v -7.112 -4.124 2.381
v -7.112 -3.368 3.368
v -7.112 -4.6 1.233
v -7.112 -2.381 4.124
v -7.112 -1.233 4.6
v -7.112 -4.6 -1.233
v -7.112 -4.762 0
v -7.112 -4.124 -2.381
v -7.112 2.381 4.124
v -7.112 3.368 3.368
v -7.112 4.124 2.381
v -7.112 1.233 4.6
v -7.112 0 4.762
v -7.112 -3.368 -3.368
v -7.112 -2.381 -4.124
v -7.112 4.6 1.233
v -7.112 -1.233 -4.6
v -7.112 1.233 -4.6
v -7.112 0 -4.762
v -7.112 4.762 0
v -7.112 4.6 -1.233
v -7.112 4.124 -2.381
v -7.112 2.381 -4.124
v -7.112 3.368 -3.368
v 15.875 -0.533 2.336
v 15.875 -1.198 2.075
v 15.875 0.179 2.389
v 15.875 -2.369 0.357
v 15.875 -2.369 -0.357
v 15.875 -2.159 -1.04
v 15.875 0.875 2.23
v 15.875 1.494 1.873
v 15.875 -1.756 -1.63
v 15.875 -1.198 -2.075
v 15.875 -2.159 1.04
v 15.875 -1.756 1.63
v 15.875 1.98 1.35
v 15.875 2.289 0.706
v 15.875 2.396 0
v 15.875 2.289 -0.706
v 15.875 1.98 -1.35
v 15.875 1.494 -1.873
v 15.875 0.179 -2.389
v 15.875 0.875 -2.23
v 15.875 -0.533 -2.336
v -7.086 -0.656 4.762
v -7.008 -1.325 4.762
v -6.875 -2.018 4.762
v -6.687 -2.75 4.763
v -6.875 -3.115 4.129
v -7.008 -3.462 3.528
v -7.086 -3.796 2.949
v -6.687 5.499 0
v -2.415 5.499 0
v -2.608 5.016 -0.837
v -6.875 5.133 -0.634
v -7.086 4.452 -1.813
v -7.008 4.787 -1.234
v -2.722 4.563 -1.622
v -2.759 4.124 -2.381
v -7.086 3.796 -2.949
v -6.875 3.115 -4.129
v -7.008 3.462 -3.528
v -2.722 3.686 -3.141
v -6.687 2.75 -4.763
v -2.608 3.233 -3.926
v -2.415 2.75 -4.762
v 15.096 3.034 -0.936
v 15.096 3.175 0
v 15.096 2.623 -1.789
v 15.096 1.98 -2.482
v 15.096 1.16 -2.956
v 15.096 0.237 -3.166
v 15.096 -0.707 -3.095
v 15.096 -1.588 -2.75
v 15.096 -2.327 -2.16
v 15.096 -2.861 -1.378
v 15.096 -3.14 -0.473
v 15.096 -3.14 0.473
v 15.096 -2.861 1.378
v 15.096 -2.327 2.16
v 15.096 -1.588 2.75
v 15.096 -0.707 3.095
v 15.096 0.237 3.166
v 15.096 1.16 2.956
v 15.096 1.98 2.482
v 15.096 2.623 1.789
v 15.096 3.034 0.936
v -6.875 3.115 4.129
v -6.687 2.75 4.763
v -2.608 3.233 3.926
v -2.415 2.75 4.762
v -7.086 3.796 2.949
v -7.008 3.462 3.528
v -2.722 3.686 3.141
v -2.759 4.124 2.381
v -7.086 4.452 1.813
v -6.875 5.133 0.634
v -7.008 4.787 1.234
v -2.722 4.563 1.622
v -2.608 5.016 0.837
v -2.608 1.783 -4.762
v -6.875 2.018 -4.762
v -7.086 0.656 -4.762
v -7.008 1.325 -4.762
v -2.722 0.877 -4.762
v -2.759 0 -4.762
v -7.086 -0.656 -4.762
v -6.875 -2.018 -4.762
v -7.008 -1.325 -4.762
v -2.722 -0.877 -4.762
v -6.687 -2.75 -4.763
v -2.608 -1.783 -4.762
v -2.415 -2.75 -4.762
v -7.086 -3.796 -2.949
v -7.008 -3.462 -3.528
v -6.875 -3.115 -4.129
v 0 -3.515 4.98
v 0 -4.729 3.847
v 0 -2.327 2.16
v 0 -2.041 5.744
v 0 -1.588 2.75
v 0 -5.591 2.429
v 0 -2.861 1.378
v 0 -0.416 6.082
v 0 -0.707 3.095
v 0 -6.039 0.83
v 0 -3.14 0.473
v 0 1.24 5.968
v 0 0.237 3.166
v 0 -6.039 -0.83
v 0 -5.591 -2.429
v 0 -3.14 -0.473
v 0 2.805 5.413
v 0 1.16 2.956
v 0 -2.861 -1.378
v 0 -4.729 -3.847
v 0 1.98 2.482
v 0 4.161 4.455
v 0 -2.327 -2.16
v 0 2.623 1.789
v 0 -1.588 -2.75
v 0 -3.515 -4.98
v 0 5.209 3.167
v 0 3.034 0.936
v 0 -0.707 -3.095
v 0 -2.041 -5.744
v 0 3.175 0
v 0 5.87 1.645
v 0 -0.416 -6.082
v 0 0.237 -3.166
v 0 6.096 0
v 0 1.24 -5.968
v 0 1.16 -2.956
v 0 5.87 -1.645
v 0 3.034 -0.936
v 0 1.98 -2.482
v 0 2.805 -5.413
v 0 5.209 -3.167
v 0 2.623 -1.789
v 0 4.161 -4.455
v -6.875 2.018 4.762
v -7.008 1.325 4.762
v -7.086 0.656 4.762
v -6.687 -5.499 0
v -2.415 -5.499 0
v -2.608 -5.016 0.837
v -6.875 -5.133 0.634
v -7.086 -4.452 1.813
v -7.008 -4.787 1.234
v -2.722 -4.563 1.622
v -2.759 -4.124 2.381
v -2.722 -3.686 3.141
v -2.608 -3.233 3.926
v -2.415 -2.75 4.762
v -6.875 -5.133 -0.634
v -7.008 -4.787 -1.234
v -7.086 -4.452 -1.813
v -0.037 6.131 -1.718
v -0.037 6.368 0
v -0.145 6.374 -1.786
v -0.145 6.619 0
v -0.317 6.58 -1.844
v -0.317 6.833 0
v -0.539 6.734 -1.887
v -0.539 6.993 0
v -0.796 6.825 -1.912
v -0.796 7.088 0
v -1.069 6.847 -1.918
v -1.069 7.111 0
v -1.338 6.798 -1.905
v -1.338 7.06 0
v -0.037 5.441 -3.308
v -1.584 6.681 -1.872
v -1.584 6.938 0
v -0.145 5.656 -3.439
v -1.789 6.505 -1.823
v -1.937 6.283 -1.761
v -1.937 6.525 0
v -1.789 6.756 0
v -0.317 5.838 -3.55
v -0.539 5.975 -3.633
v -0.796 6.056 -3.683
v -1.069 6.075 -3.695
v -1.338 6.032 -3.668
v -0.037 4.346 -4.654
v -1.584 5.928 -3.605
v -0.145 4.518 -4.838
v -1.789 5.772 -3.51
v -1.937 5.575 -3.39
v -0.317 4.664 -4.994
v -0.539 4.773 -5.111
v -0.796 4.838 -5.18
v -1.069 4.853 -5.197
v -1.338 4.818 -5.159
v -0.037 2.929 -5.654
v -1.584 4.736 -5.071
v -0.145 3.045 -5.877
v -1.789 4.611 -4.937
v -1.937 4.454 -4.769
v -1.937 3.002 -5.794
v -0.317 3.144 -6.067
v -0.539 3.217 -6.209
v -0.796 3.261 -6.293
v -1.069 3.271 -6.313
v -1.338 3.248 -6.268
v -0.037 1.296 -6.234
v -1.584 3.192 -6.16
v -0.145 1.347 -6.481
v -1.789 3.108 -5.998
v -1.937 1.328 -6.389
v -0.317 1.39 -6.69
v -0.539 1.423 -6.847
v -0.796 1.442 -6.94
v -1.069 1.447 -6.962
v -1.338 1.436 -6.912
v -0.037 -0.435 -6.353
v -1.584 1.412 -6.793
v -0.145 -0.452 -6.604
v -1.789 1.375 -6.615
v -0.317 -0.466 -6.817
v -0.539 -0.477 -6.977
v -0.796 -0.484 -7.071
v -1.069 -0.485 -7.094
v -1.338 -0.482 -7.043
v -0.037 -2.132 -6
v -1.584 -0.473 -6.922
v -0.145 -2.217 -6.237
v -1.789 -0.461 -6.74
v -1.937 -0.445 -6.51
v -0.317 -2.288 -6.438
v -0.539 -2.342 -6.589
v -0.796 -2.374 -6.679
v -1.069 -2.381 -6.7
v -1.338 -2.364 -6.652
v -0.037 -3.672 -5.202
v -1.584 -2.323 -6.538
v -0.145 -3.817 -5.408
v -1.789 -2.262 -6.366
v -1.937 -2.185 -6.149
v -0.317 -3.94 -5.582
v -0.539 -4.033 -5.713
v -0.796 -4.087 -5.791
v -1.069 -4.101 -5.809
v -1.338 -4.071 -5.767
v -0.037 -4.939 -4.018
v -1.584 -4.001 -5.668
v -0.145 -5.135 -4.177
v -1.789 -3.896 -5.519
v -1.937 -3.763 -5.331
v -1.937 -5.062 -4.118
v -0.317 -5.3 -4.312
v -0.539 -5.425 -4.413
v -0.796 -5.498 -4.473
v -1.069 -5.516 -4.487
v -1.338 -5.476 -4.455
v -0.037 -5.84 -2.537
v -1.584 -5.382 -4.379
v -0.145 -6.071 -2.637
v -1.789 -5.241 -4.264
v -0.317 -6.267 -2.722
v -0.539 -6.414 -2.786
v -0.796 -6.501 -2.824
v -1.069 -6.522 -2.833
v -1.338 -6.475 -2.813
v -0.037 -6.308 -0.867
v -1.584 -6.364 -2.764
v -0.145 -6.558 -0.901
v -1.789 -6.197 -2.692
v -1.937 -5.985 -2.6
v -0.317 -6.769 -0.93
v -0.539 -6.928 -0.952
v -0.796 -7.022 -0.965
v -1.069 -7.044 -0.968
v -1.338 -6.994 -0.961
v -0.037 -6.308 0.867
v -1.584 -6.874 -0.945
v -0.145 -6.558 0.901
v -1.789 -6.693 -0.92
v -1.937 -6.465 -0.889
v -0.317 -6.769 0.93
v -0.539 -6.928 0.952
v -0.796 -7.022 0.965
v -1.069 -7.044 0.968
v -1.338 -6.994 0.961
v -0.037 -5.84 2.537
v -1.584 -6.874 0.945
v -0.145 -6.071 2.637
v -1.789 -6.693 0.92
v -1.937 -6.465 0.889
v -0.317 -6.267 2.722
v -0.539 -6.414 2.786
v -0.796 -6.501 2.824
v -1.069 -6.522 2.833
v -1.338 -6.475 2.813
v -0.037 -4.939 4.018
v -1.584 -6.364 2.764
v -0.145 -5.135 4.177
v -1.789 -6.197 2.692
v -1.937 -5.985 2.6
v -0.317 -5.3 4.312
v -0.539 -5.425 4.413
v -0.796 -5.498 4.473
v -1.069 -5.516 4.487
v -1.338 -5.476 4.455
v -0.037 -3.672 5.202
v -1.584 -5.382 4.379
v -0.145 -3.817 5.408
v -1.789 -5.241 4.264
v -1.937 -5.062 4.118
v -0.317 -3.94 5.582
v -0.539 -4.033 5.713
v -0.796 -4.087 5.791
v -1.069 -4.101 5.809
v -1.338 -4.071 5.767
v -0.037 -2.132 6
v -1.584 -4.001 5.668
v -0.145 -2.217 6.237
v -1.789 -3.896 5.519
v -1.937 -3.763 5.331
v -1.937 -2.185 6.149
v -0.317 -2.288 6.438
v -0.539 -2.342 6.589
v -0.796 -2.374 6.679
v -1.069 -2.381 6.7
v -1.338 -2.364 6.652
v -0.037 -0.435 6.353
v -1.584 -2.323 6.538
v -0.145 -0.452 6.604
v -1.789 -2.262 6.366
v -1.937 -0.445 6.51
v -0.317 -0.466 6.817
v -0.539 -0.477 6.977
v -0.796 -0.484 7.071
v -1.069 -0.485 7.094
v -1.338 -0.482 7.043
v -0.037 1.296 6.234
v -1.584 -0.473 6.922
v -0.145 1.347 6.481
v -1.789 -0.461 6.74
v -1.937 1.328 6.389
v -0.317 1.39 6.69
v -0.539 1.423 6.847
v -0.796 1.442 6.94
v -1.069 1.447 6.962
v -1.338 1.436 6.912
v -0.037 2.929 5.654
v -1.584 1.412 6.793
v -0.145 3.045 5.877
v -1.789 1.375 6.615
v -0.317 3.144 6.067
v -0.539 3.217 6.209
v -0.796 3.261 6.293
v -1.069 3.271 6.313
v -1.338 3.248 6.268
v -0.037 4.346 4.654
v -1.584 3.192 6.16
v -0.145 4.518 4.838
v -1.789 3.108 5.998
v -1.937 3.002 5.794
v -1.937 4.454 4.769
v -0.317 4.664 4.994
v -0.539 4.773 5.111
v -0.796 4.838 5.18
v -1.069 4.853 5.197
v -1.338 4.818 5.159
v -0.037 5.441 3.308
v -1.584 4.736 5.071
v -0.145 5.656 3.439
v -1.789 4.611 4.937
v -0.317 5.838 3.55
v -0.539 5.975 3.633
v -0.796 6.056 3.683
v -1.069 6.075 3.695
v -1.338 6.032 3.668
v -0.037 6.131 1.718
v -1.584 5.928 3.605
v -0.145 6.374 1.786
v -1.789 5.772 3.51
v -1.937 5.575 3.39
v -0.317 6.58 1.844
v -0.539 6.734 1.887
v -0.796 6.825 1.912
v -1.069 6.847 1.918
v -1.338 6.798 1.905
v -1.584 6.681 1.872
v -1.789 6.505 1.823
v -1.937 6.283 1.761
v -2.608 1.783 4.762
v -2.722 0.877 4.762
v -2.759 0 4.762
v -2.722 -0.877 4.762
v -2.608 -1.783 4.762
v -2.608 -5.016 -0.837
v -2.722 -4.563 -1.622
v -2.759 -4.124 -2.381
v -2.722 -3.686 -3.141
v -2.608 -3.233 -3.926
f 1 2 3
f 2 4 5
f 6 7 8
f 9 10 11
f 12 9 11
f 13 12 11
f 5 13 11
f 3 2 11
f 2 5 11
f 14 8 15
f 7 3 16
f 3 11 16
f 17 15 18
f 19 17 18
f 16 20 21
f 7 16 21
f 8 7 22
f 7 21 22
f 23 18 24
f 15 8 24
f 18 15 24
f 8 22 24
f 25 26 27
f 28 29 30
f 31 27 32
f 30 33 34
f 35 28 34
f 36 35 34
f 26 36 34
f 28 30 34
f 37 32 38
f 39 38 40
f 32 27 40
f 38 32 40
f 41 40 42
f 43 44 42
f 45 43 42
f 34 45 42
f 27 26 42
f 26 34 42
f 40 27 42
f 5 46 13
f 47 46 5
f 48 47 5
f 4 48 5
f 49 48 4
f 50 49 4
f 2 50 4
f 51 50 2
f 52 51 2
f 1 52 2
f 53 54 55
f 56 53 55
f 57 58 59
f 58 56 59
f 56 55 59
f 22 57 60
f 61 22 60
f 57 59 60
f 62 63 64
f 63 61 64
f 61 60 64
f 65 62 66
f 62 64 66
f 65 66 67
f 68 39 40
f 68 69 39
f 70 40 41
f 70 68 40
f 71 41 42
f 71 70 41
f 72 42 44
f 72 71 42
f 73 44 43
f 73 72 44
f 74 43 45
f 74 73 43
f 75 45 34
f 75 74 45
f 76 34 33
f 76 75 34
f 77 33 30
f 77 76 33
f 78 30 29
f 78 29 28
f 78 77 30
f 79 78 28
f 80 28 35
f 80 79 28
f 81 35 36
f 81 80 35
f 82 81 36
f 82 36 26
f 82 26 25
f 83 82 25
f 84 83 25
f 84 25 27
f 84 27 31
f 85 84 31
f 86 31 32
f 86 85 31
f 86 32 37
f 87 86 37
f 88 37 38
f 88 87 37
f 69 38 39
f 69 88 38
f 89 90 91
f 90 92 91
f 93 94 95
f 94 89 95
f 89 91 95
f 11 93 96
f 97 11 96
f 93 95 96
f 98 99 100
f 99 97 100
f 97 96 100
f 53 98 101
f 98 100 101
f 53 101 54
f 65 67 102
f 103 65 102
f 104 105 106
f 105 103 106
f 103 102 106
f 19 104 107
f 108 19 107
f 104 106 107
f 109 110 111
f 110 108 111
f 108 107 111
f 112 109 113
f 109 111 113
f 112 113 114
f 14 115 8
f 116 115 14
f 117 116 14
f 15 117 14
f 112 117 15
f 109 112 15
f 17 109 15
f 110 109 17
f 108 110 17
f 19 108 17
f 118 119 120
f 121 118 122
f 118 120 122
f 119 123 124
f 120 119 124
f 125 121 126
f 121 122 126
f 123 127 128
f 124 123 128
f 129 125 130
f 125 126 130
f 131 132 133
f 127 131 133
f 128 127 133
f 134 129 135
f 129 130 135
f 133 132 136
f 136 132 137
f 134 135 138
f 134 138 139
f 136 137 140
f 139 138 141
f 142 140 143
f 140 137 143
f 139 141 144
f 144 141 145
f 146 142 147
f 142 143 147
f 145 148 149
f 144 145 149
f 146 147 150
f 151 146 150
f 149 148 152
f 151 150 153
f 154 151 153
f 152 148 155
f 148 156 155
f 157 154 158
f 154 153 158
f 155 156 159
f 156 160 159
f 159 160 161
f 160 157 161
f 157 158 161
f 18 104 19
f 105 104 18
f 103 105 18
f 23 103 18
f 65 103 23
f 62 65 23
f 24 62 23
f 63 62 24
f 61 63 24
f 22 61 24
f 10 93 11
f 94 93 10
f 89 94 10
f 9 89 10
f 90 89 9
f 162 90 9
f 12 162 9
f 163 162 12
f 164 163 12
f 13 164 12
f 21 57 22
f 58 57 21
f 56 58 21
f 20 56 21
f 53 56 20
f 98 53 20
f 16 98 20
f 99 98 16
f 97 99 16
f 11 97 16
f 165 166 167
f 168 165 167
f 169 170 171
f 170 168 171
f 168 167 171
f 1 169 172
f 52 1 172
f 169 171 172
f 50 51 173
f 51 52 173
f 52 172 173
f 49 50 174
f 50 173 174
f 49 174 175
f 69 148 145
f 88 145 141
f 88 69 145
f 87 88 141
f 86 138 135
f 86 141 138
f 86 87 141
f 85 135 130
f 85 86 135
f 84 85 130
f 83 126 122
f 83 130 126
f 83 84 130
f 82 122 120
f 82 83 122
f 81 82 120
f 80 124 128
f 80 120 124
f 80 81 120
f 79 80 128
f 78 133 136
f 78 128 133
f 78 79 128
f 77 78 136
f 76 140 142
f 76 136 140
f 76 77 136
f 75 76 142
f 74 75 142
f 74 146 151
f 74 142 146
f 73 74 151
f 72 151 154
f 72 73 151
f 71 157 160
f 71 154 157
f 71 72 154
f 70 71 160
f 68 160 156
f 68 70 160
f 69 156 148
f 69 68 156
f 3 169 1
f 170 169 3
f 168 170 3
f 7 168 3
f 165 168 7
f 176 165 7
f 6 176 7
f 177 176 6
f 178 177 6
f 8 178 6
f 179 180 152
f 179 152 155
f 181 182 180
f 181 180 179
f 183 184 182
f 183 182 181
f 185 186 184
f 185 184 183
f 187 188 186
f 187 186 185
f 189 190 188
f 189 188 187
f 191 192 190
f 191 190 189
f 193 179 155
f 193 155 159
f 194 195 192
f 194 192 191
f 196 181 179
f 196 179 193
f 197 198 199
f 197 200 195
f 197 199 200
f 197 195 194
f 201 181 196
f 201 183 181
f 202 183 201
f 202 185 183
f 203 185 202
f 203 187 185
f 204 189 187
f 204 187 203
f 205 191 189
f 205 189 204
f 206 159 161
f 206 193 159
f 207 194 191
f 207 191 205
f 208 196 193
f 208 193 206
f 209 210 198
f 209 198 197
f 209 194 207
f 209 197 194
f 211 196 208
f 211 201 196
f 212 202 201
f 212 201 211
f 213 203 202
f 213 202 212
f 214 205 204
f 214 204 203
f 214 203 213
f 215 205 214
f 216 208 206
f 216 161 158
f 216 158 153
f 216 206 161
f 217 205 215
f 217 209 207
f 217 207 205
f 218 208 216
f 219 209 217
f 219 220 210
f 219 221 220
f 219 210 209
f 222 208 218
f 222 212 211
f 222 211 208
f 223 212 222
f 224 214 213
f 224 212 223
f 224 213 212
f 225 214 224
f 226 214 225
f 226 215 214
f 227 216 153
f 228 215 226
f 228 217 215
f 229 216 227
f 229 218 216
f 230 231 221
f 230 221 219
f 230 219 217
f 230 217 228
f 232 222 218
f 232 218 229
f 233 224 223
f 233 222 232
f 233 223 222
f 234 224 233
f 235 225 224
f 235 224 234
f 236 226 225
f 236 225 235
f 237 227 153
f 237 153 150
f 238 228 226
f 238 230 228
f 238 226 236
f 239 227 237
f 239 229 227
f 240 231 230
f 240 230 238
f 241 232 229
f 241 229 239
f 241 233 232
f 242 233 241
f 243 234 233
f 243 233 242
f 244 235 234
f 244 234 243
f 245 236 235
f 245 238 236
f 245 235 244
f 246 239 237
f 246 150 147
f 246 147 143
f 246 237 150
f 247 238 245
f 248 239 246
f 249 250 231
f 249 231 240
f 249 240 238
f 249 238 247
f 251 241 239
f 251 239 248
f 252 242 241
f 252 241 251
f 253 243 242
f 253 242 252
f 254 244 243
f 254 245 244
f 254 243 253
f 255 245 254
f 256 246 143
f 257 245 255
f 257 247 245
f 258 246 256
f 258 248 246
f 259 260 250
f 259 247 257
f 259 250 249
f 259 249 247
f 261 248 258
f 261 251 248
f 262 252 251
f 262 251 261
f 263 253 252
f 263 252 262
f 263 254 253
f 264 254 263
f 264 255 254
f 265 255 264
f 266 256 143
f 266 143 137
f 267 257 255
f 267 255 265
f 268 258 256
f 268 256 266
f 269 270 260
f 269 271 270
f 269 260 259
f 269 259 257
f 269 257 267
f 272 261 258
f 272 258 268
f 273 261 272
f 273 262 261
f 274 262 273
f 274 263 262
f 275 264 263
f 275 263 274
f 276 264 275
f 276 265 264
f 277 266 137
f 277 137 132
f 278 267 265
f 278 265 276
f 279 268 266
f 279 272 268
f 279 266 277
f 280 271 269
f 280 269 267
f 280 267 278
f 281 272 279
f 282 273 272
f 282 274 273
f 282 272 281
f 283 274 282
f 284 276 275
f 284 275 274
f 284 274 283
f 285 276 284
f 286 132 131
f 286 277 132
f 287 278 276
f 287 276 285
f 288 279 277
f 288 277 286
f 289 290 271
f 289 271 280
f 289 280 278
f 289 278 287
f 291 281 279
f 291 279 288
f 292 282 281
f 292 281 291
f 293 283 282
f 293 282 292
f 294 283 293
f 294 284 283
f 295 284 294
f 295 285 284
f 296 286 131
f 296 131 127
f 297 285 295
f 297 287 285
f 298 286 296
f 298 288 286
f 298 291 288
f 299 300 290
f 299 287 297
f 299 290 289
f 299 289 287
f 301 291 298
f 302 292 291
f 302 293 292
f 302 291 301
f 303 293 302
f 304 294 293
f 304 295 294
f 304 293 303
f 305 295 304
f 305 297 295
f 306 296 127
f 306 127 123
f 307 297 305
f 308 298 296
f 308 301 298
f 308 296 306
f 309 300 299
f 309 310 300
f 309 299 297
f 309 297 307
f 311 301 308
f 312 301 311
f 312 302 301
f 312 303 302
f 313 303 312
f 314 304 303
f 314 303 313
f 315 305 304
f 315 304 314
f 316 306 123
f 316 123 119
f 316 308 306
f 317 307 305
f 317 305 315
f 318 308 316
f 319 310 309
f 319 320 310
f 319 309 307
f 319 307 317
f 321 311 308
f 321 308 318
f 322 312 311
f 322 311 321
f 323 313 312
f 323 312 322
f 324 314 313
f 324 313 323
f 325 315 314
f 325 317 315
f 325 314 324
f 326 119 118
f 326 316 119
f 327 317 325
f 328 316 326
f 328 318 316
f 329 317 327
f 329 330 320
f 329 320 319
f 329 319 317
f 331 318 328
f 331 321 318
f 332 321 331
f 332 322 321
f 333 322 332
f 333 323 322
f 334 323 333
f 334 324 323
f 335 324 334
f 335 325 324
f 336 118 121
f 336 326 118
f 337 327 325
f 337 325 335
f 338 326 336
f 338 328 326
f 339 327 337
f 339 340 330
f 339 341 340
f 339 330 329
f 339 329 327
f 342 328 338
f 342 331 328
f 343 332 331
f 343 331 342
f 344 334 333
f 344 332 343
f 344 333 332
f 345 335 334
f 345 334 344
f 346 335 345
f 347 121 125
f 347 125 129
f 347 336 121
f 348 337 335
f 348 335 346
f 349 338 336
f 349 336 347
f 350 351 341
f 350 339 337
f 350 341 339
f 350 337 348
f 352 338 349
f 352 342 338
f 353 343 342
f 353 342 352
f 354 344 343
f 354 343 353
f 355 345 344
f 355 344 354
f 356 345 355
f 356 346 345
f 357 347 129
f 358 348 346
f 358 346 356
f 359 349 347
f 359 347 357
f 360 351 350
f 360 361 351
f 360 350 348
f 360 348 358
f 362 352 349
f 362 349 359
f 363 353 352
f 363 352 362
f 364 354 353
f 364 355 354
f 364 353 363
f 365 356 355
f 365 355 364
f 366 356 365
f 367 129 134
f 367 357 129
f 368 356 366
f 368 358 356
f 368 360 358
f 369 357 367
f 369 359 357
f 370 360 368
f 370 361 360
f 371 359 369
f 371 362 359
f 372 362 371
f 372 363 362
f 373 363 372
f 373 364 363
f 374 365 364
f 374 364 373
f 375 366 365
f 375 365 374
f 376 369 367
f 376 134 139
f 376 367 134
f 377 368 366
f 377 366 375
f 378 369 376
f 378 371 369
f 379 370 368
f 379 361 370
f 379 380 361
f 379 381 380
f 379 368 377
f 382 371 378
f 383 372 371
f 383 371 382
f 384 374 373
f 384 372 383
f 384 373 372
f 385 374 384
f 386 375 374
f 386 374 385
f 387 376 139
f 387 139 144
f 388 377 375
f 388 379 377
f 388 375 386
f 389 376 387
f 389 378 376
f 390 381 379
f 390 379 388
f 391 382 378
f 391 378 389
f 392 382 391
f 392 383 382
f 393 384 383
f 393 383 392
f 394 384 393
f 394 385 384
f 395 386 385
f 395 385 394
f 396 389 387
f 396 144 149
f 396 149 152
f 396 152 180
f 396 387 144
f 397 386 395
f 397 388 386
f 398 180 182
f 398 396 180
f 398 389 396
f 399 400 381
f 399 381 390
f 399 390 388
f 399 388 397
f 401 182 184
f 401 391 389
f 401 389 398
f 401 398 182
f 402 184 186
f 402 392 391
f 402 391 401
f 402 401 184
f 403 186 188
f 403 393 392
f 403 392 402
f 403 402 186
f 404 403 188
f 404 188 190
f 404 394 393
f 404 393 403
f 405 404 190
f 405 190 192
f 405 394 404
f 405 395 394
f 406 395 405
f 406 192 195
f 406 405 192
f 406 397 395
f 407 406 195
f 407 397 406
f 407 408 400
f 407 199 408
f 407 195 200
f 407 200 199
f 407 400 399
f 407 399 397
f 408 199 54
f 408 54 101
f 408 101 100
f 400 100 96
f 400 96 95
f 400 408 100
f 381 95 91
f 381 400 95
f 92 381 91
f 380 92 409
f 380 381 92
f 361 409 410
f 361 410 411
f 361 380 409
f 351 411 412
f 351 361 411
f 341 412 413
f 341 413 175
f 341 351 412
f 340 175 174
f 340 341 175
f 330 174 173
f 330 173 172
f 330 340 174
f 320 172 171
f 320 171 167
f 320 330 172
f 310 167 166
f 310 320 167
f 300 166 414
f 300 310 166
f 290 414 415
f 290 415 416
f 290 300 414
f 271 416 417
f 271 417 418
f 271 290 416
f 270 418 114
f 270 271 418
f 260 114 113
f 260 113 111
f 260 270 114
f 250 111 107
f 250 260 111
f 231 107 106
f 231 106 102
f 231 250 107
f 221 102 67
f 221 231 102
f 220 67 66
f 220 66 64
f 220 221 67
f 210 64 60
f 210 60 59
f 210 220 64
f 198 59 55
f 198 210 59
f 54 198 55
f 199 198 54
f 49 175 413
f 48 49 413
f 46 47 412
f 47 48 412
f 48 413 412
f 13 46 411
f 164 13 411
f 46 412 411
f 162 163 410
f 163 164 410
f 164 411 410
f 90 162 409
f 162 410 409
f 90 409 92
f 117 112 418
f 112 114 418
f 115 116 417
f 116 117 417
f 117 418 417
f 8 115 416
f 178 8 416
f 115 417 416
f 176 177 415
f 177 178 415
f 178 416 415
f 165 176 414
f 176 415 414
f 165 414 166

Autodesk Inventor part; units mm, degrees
ref_plane "YZ Plane" through (0, 0, 0) normal (1, 0, 0) x (0, 1, 0)
ref_plane "XZ Plane" through (0, 0, 0) normal (0, 1, 0) x (-1, 0, 0)
sketch "Sketch1" plane through (0, 0, 0) normal (0, 0, 1) x (1, 0, 0)
  line L0 (-3.2004, 0) -> (-3.2004, 3.8156)
  line L1 (0, 6.096) -> (0, 3.175)
  line L2 (4.1148, 3.175) -> (15.875, 3.175)
  line L3 (15.875, 3.175) -> (15.875, 0)
  line L4 (15.875, 0) -> (-3.2004, 0)
  arc A0 (0, 6.096) -> (-1.9368, 6.5254) centre (-1.016, 6.096) ccw
  line L5 (0, -1.4605) -> (0, 8.7631) projected
  line L6 (-7.0155, 0) -> (19.6901, 0) projected
  line L7 (0, 3.175) -> (0.0001, 3.175)
  line L8 (0.0001, 3.175) -> (0.0001, 3.175)
  line L9 (0.0001, 3.175) -> (2.2098, 3.175)
  line L10 (2.2098, 3.175) -> (4.1148, 3.175)
  line L11 (-3.2004, 3.8156) -> (-1.9368, 6.5254)
  line L12 (0.0001, 3.175) -> (4.1148, 3.175) construction
  line L13 (4.1148, 3.175) -> (4.1148, 0) construction
  dimension "d0" = 1.016
  dimension "d1" = 15.875
  dimension "d2" = 11.7602
  dimension "d3" = 14.224
  dimension "d4" = 6.35
  dimension "d5" = 3.2004
  dimension "d15" = 6.35
  dimension "d16" = 6.35
  dimension "d17" = 0.0001
  dimension "d18" = 1.905
  dimension "d19" = 25
revolve "Body" add sketch "Sketch1" angle 360 about axis through (15.875, 0, 0) along (-1, 0, 0)
sketch "Sketch2" plane through (0, 0, 0) normal (1, 0, 0) x (0, 0, -1)
  line L0 (4.7625, 2.7496) -> (4.7625, -2.7496)
  line L1 (4.7625, -2.7496) -> (0, -5.4993)
  line L2 (0, -5.4993) -> (-4.7625, -2.7496)
  line L3 (-4.7625, -2.7496) -> (-4.7625, 2.7496)
  line L4 (-4.7625, 2.7496) -> (0, 5.4993)
  line L5 (0, 5.4993) -> (4.7625, 2.7496)
  point P0 (0, 0)
  point P1 (0, 0)
  dimension "d23" = 9.525
extrude "Head" add sketch "Sketch2" against normal blind 7.112
sketch "Sketch3" plane through (0, 0, 0) normal (0, 0, 1) x (1, 0, 0)
  line L0 (-7.112, 4.7625) -> (-7.112, 5.4993)
  line L1 (-7.112, 5.4993) -> (-6.6866, 5.4993)
  line L2 (-6.6866, 5.4993) -> (-7.112, 4.7625)
  line L3 (-8.0513, 0) -> (-1.476, 0) projected
  line L4 (-7.112, 5.4993) -> (-7.112, 2.7496) projected
  line L5 (-2.4153, 5.4993) -> (-7.112, 5.4993) projected
  point P0 (-7.112, 2.7496)
  dimension "d8" = 30
  dimension "d22" = 9.525
revolve "Chamfer1" cut sketch "Sketch3" angle 360 about axis through (-10, 0, 0) along (1, 0, 0)
thread "Thread" size "1/4-20 UNC" class "2A" standard "ANSI Unified Screw Threads" length 11.7602
chamfer "Chamfer2" distance 0.7791 distance2 0.7791 1 edges at (15.875, -3.175, 0) measured on face at (15.875, 0.0371, -1.7957)
ref_plane "Work Plane1" through (10.95, 0, 0) normal (0, 0, -1) x (1, 0, 0)
equation "\"d23\" = SW"
equation "\"d6\" = KOH"
equation "\"d10\" = GEL"
equation "\"d13\" = -0.5 * SPD + 0.5 * GD"
equation "\"d14\" = GUL"
equation "\"d0\" = PHH"
equation "\"d1\" = NLG"
equation "\"d2\" = GEL"
equation "\"d3\" = LADI"
equation "\"d4\" = GD"
equation "\"d5\" = 0.45 * KOH"
equation "\"d15\" = SD2"
equation "\"d16\" = BDM"
equation "\"d18\" = GAL"
equation "\"d19\" = KEWI"
equation "\"d8\" = ANG1"
equation "\"d22\" = SW0"
equation "\"NLG\" = 15.875"
equation "\"GD\" = NND"
equation "\"BDM\" = NND"
equation "\"KOH\" = 7.112"
equation "\"GEL\" = 11.7602"
equation "\"LADI\" = 14.224"
equation "\"SW\" = 9.525"
equation "\"PHH\" = 1.016"
equation "\"SW0\" = SW"
equation "\"SPD\" = 4.79184"
equation "\"SD2\" = NND"
equation "\"SD\" = 0"
equation "\"ANG1\" = 30deg"
equation "\"KEWI\" = 25deg"
equation "\"GAL\" = 1.905"
equation "\"GUL\" = 0.77908"
equation "\"THREADDIA\" = 6.35"
equation "\"SDH\" = SW"
equation "\"TOA\" = 30deg"
equation "\"NND\" = 6.35"
equation "\"E0\" = 1.155 * SW"
equation "\"GD1\" = 4.79184"
properties part number "92979A114" material "Steel, Mild"
